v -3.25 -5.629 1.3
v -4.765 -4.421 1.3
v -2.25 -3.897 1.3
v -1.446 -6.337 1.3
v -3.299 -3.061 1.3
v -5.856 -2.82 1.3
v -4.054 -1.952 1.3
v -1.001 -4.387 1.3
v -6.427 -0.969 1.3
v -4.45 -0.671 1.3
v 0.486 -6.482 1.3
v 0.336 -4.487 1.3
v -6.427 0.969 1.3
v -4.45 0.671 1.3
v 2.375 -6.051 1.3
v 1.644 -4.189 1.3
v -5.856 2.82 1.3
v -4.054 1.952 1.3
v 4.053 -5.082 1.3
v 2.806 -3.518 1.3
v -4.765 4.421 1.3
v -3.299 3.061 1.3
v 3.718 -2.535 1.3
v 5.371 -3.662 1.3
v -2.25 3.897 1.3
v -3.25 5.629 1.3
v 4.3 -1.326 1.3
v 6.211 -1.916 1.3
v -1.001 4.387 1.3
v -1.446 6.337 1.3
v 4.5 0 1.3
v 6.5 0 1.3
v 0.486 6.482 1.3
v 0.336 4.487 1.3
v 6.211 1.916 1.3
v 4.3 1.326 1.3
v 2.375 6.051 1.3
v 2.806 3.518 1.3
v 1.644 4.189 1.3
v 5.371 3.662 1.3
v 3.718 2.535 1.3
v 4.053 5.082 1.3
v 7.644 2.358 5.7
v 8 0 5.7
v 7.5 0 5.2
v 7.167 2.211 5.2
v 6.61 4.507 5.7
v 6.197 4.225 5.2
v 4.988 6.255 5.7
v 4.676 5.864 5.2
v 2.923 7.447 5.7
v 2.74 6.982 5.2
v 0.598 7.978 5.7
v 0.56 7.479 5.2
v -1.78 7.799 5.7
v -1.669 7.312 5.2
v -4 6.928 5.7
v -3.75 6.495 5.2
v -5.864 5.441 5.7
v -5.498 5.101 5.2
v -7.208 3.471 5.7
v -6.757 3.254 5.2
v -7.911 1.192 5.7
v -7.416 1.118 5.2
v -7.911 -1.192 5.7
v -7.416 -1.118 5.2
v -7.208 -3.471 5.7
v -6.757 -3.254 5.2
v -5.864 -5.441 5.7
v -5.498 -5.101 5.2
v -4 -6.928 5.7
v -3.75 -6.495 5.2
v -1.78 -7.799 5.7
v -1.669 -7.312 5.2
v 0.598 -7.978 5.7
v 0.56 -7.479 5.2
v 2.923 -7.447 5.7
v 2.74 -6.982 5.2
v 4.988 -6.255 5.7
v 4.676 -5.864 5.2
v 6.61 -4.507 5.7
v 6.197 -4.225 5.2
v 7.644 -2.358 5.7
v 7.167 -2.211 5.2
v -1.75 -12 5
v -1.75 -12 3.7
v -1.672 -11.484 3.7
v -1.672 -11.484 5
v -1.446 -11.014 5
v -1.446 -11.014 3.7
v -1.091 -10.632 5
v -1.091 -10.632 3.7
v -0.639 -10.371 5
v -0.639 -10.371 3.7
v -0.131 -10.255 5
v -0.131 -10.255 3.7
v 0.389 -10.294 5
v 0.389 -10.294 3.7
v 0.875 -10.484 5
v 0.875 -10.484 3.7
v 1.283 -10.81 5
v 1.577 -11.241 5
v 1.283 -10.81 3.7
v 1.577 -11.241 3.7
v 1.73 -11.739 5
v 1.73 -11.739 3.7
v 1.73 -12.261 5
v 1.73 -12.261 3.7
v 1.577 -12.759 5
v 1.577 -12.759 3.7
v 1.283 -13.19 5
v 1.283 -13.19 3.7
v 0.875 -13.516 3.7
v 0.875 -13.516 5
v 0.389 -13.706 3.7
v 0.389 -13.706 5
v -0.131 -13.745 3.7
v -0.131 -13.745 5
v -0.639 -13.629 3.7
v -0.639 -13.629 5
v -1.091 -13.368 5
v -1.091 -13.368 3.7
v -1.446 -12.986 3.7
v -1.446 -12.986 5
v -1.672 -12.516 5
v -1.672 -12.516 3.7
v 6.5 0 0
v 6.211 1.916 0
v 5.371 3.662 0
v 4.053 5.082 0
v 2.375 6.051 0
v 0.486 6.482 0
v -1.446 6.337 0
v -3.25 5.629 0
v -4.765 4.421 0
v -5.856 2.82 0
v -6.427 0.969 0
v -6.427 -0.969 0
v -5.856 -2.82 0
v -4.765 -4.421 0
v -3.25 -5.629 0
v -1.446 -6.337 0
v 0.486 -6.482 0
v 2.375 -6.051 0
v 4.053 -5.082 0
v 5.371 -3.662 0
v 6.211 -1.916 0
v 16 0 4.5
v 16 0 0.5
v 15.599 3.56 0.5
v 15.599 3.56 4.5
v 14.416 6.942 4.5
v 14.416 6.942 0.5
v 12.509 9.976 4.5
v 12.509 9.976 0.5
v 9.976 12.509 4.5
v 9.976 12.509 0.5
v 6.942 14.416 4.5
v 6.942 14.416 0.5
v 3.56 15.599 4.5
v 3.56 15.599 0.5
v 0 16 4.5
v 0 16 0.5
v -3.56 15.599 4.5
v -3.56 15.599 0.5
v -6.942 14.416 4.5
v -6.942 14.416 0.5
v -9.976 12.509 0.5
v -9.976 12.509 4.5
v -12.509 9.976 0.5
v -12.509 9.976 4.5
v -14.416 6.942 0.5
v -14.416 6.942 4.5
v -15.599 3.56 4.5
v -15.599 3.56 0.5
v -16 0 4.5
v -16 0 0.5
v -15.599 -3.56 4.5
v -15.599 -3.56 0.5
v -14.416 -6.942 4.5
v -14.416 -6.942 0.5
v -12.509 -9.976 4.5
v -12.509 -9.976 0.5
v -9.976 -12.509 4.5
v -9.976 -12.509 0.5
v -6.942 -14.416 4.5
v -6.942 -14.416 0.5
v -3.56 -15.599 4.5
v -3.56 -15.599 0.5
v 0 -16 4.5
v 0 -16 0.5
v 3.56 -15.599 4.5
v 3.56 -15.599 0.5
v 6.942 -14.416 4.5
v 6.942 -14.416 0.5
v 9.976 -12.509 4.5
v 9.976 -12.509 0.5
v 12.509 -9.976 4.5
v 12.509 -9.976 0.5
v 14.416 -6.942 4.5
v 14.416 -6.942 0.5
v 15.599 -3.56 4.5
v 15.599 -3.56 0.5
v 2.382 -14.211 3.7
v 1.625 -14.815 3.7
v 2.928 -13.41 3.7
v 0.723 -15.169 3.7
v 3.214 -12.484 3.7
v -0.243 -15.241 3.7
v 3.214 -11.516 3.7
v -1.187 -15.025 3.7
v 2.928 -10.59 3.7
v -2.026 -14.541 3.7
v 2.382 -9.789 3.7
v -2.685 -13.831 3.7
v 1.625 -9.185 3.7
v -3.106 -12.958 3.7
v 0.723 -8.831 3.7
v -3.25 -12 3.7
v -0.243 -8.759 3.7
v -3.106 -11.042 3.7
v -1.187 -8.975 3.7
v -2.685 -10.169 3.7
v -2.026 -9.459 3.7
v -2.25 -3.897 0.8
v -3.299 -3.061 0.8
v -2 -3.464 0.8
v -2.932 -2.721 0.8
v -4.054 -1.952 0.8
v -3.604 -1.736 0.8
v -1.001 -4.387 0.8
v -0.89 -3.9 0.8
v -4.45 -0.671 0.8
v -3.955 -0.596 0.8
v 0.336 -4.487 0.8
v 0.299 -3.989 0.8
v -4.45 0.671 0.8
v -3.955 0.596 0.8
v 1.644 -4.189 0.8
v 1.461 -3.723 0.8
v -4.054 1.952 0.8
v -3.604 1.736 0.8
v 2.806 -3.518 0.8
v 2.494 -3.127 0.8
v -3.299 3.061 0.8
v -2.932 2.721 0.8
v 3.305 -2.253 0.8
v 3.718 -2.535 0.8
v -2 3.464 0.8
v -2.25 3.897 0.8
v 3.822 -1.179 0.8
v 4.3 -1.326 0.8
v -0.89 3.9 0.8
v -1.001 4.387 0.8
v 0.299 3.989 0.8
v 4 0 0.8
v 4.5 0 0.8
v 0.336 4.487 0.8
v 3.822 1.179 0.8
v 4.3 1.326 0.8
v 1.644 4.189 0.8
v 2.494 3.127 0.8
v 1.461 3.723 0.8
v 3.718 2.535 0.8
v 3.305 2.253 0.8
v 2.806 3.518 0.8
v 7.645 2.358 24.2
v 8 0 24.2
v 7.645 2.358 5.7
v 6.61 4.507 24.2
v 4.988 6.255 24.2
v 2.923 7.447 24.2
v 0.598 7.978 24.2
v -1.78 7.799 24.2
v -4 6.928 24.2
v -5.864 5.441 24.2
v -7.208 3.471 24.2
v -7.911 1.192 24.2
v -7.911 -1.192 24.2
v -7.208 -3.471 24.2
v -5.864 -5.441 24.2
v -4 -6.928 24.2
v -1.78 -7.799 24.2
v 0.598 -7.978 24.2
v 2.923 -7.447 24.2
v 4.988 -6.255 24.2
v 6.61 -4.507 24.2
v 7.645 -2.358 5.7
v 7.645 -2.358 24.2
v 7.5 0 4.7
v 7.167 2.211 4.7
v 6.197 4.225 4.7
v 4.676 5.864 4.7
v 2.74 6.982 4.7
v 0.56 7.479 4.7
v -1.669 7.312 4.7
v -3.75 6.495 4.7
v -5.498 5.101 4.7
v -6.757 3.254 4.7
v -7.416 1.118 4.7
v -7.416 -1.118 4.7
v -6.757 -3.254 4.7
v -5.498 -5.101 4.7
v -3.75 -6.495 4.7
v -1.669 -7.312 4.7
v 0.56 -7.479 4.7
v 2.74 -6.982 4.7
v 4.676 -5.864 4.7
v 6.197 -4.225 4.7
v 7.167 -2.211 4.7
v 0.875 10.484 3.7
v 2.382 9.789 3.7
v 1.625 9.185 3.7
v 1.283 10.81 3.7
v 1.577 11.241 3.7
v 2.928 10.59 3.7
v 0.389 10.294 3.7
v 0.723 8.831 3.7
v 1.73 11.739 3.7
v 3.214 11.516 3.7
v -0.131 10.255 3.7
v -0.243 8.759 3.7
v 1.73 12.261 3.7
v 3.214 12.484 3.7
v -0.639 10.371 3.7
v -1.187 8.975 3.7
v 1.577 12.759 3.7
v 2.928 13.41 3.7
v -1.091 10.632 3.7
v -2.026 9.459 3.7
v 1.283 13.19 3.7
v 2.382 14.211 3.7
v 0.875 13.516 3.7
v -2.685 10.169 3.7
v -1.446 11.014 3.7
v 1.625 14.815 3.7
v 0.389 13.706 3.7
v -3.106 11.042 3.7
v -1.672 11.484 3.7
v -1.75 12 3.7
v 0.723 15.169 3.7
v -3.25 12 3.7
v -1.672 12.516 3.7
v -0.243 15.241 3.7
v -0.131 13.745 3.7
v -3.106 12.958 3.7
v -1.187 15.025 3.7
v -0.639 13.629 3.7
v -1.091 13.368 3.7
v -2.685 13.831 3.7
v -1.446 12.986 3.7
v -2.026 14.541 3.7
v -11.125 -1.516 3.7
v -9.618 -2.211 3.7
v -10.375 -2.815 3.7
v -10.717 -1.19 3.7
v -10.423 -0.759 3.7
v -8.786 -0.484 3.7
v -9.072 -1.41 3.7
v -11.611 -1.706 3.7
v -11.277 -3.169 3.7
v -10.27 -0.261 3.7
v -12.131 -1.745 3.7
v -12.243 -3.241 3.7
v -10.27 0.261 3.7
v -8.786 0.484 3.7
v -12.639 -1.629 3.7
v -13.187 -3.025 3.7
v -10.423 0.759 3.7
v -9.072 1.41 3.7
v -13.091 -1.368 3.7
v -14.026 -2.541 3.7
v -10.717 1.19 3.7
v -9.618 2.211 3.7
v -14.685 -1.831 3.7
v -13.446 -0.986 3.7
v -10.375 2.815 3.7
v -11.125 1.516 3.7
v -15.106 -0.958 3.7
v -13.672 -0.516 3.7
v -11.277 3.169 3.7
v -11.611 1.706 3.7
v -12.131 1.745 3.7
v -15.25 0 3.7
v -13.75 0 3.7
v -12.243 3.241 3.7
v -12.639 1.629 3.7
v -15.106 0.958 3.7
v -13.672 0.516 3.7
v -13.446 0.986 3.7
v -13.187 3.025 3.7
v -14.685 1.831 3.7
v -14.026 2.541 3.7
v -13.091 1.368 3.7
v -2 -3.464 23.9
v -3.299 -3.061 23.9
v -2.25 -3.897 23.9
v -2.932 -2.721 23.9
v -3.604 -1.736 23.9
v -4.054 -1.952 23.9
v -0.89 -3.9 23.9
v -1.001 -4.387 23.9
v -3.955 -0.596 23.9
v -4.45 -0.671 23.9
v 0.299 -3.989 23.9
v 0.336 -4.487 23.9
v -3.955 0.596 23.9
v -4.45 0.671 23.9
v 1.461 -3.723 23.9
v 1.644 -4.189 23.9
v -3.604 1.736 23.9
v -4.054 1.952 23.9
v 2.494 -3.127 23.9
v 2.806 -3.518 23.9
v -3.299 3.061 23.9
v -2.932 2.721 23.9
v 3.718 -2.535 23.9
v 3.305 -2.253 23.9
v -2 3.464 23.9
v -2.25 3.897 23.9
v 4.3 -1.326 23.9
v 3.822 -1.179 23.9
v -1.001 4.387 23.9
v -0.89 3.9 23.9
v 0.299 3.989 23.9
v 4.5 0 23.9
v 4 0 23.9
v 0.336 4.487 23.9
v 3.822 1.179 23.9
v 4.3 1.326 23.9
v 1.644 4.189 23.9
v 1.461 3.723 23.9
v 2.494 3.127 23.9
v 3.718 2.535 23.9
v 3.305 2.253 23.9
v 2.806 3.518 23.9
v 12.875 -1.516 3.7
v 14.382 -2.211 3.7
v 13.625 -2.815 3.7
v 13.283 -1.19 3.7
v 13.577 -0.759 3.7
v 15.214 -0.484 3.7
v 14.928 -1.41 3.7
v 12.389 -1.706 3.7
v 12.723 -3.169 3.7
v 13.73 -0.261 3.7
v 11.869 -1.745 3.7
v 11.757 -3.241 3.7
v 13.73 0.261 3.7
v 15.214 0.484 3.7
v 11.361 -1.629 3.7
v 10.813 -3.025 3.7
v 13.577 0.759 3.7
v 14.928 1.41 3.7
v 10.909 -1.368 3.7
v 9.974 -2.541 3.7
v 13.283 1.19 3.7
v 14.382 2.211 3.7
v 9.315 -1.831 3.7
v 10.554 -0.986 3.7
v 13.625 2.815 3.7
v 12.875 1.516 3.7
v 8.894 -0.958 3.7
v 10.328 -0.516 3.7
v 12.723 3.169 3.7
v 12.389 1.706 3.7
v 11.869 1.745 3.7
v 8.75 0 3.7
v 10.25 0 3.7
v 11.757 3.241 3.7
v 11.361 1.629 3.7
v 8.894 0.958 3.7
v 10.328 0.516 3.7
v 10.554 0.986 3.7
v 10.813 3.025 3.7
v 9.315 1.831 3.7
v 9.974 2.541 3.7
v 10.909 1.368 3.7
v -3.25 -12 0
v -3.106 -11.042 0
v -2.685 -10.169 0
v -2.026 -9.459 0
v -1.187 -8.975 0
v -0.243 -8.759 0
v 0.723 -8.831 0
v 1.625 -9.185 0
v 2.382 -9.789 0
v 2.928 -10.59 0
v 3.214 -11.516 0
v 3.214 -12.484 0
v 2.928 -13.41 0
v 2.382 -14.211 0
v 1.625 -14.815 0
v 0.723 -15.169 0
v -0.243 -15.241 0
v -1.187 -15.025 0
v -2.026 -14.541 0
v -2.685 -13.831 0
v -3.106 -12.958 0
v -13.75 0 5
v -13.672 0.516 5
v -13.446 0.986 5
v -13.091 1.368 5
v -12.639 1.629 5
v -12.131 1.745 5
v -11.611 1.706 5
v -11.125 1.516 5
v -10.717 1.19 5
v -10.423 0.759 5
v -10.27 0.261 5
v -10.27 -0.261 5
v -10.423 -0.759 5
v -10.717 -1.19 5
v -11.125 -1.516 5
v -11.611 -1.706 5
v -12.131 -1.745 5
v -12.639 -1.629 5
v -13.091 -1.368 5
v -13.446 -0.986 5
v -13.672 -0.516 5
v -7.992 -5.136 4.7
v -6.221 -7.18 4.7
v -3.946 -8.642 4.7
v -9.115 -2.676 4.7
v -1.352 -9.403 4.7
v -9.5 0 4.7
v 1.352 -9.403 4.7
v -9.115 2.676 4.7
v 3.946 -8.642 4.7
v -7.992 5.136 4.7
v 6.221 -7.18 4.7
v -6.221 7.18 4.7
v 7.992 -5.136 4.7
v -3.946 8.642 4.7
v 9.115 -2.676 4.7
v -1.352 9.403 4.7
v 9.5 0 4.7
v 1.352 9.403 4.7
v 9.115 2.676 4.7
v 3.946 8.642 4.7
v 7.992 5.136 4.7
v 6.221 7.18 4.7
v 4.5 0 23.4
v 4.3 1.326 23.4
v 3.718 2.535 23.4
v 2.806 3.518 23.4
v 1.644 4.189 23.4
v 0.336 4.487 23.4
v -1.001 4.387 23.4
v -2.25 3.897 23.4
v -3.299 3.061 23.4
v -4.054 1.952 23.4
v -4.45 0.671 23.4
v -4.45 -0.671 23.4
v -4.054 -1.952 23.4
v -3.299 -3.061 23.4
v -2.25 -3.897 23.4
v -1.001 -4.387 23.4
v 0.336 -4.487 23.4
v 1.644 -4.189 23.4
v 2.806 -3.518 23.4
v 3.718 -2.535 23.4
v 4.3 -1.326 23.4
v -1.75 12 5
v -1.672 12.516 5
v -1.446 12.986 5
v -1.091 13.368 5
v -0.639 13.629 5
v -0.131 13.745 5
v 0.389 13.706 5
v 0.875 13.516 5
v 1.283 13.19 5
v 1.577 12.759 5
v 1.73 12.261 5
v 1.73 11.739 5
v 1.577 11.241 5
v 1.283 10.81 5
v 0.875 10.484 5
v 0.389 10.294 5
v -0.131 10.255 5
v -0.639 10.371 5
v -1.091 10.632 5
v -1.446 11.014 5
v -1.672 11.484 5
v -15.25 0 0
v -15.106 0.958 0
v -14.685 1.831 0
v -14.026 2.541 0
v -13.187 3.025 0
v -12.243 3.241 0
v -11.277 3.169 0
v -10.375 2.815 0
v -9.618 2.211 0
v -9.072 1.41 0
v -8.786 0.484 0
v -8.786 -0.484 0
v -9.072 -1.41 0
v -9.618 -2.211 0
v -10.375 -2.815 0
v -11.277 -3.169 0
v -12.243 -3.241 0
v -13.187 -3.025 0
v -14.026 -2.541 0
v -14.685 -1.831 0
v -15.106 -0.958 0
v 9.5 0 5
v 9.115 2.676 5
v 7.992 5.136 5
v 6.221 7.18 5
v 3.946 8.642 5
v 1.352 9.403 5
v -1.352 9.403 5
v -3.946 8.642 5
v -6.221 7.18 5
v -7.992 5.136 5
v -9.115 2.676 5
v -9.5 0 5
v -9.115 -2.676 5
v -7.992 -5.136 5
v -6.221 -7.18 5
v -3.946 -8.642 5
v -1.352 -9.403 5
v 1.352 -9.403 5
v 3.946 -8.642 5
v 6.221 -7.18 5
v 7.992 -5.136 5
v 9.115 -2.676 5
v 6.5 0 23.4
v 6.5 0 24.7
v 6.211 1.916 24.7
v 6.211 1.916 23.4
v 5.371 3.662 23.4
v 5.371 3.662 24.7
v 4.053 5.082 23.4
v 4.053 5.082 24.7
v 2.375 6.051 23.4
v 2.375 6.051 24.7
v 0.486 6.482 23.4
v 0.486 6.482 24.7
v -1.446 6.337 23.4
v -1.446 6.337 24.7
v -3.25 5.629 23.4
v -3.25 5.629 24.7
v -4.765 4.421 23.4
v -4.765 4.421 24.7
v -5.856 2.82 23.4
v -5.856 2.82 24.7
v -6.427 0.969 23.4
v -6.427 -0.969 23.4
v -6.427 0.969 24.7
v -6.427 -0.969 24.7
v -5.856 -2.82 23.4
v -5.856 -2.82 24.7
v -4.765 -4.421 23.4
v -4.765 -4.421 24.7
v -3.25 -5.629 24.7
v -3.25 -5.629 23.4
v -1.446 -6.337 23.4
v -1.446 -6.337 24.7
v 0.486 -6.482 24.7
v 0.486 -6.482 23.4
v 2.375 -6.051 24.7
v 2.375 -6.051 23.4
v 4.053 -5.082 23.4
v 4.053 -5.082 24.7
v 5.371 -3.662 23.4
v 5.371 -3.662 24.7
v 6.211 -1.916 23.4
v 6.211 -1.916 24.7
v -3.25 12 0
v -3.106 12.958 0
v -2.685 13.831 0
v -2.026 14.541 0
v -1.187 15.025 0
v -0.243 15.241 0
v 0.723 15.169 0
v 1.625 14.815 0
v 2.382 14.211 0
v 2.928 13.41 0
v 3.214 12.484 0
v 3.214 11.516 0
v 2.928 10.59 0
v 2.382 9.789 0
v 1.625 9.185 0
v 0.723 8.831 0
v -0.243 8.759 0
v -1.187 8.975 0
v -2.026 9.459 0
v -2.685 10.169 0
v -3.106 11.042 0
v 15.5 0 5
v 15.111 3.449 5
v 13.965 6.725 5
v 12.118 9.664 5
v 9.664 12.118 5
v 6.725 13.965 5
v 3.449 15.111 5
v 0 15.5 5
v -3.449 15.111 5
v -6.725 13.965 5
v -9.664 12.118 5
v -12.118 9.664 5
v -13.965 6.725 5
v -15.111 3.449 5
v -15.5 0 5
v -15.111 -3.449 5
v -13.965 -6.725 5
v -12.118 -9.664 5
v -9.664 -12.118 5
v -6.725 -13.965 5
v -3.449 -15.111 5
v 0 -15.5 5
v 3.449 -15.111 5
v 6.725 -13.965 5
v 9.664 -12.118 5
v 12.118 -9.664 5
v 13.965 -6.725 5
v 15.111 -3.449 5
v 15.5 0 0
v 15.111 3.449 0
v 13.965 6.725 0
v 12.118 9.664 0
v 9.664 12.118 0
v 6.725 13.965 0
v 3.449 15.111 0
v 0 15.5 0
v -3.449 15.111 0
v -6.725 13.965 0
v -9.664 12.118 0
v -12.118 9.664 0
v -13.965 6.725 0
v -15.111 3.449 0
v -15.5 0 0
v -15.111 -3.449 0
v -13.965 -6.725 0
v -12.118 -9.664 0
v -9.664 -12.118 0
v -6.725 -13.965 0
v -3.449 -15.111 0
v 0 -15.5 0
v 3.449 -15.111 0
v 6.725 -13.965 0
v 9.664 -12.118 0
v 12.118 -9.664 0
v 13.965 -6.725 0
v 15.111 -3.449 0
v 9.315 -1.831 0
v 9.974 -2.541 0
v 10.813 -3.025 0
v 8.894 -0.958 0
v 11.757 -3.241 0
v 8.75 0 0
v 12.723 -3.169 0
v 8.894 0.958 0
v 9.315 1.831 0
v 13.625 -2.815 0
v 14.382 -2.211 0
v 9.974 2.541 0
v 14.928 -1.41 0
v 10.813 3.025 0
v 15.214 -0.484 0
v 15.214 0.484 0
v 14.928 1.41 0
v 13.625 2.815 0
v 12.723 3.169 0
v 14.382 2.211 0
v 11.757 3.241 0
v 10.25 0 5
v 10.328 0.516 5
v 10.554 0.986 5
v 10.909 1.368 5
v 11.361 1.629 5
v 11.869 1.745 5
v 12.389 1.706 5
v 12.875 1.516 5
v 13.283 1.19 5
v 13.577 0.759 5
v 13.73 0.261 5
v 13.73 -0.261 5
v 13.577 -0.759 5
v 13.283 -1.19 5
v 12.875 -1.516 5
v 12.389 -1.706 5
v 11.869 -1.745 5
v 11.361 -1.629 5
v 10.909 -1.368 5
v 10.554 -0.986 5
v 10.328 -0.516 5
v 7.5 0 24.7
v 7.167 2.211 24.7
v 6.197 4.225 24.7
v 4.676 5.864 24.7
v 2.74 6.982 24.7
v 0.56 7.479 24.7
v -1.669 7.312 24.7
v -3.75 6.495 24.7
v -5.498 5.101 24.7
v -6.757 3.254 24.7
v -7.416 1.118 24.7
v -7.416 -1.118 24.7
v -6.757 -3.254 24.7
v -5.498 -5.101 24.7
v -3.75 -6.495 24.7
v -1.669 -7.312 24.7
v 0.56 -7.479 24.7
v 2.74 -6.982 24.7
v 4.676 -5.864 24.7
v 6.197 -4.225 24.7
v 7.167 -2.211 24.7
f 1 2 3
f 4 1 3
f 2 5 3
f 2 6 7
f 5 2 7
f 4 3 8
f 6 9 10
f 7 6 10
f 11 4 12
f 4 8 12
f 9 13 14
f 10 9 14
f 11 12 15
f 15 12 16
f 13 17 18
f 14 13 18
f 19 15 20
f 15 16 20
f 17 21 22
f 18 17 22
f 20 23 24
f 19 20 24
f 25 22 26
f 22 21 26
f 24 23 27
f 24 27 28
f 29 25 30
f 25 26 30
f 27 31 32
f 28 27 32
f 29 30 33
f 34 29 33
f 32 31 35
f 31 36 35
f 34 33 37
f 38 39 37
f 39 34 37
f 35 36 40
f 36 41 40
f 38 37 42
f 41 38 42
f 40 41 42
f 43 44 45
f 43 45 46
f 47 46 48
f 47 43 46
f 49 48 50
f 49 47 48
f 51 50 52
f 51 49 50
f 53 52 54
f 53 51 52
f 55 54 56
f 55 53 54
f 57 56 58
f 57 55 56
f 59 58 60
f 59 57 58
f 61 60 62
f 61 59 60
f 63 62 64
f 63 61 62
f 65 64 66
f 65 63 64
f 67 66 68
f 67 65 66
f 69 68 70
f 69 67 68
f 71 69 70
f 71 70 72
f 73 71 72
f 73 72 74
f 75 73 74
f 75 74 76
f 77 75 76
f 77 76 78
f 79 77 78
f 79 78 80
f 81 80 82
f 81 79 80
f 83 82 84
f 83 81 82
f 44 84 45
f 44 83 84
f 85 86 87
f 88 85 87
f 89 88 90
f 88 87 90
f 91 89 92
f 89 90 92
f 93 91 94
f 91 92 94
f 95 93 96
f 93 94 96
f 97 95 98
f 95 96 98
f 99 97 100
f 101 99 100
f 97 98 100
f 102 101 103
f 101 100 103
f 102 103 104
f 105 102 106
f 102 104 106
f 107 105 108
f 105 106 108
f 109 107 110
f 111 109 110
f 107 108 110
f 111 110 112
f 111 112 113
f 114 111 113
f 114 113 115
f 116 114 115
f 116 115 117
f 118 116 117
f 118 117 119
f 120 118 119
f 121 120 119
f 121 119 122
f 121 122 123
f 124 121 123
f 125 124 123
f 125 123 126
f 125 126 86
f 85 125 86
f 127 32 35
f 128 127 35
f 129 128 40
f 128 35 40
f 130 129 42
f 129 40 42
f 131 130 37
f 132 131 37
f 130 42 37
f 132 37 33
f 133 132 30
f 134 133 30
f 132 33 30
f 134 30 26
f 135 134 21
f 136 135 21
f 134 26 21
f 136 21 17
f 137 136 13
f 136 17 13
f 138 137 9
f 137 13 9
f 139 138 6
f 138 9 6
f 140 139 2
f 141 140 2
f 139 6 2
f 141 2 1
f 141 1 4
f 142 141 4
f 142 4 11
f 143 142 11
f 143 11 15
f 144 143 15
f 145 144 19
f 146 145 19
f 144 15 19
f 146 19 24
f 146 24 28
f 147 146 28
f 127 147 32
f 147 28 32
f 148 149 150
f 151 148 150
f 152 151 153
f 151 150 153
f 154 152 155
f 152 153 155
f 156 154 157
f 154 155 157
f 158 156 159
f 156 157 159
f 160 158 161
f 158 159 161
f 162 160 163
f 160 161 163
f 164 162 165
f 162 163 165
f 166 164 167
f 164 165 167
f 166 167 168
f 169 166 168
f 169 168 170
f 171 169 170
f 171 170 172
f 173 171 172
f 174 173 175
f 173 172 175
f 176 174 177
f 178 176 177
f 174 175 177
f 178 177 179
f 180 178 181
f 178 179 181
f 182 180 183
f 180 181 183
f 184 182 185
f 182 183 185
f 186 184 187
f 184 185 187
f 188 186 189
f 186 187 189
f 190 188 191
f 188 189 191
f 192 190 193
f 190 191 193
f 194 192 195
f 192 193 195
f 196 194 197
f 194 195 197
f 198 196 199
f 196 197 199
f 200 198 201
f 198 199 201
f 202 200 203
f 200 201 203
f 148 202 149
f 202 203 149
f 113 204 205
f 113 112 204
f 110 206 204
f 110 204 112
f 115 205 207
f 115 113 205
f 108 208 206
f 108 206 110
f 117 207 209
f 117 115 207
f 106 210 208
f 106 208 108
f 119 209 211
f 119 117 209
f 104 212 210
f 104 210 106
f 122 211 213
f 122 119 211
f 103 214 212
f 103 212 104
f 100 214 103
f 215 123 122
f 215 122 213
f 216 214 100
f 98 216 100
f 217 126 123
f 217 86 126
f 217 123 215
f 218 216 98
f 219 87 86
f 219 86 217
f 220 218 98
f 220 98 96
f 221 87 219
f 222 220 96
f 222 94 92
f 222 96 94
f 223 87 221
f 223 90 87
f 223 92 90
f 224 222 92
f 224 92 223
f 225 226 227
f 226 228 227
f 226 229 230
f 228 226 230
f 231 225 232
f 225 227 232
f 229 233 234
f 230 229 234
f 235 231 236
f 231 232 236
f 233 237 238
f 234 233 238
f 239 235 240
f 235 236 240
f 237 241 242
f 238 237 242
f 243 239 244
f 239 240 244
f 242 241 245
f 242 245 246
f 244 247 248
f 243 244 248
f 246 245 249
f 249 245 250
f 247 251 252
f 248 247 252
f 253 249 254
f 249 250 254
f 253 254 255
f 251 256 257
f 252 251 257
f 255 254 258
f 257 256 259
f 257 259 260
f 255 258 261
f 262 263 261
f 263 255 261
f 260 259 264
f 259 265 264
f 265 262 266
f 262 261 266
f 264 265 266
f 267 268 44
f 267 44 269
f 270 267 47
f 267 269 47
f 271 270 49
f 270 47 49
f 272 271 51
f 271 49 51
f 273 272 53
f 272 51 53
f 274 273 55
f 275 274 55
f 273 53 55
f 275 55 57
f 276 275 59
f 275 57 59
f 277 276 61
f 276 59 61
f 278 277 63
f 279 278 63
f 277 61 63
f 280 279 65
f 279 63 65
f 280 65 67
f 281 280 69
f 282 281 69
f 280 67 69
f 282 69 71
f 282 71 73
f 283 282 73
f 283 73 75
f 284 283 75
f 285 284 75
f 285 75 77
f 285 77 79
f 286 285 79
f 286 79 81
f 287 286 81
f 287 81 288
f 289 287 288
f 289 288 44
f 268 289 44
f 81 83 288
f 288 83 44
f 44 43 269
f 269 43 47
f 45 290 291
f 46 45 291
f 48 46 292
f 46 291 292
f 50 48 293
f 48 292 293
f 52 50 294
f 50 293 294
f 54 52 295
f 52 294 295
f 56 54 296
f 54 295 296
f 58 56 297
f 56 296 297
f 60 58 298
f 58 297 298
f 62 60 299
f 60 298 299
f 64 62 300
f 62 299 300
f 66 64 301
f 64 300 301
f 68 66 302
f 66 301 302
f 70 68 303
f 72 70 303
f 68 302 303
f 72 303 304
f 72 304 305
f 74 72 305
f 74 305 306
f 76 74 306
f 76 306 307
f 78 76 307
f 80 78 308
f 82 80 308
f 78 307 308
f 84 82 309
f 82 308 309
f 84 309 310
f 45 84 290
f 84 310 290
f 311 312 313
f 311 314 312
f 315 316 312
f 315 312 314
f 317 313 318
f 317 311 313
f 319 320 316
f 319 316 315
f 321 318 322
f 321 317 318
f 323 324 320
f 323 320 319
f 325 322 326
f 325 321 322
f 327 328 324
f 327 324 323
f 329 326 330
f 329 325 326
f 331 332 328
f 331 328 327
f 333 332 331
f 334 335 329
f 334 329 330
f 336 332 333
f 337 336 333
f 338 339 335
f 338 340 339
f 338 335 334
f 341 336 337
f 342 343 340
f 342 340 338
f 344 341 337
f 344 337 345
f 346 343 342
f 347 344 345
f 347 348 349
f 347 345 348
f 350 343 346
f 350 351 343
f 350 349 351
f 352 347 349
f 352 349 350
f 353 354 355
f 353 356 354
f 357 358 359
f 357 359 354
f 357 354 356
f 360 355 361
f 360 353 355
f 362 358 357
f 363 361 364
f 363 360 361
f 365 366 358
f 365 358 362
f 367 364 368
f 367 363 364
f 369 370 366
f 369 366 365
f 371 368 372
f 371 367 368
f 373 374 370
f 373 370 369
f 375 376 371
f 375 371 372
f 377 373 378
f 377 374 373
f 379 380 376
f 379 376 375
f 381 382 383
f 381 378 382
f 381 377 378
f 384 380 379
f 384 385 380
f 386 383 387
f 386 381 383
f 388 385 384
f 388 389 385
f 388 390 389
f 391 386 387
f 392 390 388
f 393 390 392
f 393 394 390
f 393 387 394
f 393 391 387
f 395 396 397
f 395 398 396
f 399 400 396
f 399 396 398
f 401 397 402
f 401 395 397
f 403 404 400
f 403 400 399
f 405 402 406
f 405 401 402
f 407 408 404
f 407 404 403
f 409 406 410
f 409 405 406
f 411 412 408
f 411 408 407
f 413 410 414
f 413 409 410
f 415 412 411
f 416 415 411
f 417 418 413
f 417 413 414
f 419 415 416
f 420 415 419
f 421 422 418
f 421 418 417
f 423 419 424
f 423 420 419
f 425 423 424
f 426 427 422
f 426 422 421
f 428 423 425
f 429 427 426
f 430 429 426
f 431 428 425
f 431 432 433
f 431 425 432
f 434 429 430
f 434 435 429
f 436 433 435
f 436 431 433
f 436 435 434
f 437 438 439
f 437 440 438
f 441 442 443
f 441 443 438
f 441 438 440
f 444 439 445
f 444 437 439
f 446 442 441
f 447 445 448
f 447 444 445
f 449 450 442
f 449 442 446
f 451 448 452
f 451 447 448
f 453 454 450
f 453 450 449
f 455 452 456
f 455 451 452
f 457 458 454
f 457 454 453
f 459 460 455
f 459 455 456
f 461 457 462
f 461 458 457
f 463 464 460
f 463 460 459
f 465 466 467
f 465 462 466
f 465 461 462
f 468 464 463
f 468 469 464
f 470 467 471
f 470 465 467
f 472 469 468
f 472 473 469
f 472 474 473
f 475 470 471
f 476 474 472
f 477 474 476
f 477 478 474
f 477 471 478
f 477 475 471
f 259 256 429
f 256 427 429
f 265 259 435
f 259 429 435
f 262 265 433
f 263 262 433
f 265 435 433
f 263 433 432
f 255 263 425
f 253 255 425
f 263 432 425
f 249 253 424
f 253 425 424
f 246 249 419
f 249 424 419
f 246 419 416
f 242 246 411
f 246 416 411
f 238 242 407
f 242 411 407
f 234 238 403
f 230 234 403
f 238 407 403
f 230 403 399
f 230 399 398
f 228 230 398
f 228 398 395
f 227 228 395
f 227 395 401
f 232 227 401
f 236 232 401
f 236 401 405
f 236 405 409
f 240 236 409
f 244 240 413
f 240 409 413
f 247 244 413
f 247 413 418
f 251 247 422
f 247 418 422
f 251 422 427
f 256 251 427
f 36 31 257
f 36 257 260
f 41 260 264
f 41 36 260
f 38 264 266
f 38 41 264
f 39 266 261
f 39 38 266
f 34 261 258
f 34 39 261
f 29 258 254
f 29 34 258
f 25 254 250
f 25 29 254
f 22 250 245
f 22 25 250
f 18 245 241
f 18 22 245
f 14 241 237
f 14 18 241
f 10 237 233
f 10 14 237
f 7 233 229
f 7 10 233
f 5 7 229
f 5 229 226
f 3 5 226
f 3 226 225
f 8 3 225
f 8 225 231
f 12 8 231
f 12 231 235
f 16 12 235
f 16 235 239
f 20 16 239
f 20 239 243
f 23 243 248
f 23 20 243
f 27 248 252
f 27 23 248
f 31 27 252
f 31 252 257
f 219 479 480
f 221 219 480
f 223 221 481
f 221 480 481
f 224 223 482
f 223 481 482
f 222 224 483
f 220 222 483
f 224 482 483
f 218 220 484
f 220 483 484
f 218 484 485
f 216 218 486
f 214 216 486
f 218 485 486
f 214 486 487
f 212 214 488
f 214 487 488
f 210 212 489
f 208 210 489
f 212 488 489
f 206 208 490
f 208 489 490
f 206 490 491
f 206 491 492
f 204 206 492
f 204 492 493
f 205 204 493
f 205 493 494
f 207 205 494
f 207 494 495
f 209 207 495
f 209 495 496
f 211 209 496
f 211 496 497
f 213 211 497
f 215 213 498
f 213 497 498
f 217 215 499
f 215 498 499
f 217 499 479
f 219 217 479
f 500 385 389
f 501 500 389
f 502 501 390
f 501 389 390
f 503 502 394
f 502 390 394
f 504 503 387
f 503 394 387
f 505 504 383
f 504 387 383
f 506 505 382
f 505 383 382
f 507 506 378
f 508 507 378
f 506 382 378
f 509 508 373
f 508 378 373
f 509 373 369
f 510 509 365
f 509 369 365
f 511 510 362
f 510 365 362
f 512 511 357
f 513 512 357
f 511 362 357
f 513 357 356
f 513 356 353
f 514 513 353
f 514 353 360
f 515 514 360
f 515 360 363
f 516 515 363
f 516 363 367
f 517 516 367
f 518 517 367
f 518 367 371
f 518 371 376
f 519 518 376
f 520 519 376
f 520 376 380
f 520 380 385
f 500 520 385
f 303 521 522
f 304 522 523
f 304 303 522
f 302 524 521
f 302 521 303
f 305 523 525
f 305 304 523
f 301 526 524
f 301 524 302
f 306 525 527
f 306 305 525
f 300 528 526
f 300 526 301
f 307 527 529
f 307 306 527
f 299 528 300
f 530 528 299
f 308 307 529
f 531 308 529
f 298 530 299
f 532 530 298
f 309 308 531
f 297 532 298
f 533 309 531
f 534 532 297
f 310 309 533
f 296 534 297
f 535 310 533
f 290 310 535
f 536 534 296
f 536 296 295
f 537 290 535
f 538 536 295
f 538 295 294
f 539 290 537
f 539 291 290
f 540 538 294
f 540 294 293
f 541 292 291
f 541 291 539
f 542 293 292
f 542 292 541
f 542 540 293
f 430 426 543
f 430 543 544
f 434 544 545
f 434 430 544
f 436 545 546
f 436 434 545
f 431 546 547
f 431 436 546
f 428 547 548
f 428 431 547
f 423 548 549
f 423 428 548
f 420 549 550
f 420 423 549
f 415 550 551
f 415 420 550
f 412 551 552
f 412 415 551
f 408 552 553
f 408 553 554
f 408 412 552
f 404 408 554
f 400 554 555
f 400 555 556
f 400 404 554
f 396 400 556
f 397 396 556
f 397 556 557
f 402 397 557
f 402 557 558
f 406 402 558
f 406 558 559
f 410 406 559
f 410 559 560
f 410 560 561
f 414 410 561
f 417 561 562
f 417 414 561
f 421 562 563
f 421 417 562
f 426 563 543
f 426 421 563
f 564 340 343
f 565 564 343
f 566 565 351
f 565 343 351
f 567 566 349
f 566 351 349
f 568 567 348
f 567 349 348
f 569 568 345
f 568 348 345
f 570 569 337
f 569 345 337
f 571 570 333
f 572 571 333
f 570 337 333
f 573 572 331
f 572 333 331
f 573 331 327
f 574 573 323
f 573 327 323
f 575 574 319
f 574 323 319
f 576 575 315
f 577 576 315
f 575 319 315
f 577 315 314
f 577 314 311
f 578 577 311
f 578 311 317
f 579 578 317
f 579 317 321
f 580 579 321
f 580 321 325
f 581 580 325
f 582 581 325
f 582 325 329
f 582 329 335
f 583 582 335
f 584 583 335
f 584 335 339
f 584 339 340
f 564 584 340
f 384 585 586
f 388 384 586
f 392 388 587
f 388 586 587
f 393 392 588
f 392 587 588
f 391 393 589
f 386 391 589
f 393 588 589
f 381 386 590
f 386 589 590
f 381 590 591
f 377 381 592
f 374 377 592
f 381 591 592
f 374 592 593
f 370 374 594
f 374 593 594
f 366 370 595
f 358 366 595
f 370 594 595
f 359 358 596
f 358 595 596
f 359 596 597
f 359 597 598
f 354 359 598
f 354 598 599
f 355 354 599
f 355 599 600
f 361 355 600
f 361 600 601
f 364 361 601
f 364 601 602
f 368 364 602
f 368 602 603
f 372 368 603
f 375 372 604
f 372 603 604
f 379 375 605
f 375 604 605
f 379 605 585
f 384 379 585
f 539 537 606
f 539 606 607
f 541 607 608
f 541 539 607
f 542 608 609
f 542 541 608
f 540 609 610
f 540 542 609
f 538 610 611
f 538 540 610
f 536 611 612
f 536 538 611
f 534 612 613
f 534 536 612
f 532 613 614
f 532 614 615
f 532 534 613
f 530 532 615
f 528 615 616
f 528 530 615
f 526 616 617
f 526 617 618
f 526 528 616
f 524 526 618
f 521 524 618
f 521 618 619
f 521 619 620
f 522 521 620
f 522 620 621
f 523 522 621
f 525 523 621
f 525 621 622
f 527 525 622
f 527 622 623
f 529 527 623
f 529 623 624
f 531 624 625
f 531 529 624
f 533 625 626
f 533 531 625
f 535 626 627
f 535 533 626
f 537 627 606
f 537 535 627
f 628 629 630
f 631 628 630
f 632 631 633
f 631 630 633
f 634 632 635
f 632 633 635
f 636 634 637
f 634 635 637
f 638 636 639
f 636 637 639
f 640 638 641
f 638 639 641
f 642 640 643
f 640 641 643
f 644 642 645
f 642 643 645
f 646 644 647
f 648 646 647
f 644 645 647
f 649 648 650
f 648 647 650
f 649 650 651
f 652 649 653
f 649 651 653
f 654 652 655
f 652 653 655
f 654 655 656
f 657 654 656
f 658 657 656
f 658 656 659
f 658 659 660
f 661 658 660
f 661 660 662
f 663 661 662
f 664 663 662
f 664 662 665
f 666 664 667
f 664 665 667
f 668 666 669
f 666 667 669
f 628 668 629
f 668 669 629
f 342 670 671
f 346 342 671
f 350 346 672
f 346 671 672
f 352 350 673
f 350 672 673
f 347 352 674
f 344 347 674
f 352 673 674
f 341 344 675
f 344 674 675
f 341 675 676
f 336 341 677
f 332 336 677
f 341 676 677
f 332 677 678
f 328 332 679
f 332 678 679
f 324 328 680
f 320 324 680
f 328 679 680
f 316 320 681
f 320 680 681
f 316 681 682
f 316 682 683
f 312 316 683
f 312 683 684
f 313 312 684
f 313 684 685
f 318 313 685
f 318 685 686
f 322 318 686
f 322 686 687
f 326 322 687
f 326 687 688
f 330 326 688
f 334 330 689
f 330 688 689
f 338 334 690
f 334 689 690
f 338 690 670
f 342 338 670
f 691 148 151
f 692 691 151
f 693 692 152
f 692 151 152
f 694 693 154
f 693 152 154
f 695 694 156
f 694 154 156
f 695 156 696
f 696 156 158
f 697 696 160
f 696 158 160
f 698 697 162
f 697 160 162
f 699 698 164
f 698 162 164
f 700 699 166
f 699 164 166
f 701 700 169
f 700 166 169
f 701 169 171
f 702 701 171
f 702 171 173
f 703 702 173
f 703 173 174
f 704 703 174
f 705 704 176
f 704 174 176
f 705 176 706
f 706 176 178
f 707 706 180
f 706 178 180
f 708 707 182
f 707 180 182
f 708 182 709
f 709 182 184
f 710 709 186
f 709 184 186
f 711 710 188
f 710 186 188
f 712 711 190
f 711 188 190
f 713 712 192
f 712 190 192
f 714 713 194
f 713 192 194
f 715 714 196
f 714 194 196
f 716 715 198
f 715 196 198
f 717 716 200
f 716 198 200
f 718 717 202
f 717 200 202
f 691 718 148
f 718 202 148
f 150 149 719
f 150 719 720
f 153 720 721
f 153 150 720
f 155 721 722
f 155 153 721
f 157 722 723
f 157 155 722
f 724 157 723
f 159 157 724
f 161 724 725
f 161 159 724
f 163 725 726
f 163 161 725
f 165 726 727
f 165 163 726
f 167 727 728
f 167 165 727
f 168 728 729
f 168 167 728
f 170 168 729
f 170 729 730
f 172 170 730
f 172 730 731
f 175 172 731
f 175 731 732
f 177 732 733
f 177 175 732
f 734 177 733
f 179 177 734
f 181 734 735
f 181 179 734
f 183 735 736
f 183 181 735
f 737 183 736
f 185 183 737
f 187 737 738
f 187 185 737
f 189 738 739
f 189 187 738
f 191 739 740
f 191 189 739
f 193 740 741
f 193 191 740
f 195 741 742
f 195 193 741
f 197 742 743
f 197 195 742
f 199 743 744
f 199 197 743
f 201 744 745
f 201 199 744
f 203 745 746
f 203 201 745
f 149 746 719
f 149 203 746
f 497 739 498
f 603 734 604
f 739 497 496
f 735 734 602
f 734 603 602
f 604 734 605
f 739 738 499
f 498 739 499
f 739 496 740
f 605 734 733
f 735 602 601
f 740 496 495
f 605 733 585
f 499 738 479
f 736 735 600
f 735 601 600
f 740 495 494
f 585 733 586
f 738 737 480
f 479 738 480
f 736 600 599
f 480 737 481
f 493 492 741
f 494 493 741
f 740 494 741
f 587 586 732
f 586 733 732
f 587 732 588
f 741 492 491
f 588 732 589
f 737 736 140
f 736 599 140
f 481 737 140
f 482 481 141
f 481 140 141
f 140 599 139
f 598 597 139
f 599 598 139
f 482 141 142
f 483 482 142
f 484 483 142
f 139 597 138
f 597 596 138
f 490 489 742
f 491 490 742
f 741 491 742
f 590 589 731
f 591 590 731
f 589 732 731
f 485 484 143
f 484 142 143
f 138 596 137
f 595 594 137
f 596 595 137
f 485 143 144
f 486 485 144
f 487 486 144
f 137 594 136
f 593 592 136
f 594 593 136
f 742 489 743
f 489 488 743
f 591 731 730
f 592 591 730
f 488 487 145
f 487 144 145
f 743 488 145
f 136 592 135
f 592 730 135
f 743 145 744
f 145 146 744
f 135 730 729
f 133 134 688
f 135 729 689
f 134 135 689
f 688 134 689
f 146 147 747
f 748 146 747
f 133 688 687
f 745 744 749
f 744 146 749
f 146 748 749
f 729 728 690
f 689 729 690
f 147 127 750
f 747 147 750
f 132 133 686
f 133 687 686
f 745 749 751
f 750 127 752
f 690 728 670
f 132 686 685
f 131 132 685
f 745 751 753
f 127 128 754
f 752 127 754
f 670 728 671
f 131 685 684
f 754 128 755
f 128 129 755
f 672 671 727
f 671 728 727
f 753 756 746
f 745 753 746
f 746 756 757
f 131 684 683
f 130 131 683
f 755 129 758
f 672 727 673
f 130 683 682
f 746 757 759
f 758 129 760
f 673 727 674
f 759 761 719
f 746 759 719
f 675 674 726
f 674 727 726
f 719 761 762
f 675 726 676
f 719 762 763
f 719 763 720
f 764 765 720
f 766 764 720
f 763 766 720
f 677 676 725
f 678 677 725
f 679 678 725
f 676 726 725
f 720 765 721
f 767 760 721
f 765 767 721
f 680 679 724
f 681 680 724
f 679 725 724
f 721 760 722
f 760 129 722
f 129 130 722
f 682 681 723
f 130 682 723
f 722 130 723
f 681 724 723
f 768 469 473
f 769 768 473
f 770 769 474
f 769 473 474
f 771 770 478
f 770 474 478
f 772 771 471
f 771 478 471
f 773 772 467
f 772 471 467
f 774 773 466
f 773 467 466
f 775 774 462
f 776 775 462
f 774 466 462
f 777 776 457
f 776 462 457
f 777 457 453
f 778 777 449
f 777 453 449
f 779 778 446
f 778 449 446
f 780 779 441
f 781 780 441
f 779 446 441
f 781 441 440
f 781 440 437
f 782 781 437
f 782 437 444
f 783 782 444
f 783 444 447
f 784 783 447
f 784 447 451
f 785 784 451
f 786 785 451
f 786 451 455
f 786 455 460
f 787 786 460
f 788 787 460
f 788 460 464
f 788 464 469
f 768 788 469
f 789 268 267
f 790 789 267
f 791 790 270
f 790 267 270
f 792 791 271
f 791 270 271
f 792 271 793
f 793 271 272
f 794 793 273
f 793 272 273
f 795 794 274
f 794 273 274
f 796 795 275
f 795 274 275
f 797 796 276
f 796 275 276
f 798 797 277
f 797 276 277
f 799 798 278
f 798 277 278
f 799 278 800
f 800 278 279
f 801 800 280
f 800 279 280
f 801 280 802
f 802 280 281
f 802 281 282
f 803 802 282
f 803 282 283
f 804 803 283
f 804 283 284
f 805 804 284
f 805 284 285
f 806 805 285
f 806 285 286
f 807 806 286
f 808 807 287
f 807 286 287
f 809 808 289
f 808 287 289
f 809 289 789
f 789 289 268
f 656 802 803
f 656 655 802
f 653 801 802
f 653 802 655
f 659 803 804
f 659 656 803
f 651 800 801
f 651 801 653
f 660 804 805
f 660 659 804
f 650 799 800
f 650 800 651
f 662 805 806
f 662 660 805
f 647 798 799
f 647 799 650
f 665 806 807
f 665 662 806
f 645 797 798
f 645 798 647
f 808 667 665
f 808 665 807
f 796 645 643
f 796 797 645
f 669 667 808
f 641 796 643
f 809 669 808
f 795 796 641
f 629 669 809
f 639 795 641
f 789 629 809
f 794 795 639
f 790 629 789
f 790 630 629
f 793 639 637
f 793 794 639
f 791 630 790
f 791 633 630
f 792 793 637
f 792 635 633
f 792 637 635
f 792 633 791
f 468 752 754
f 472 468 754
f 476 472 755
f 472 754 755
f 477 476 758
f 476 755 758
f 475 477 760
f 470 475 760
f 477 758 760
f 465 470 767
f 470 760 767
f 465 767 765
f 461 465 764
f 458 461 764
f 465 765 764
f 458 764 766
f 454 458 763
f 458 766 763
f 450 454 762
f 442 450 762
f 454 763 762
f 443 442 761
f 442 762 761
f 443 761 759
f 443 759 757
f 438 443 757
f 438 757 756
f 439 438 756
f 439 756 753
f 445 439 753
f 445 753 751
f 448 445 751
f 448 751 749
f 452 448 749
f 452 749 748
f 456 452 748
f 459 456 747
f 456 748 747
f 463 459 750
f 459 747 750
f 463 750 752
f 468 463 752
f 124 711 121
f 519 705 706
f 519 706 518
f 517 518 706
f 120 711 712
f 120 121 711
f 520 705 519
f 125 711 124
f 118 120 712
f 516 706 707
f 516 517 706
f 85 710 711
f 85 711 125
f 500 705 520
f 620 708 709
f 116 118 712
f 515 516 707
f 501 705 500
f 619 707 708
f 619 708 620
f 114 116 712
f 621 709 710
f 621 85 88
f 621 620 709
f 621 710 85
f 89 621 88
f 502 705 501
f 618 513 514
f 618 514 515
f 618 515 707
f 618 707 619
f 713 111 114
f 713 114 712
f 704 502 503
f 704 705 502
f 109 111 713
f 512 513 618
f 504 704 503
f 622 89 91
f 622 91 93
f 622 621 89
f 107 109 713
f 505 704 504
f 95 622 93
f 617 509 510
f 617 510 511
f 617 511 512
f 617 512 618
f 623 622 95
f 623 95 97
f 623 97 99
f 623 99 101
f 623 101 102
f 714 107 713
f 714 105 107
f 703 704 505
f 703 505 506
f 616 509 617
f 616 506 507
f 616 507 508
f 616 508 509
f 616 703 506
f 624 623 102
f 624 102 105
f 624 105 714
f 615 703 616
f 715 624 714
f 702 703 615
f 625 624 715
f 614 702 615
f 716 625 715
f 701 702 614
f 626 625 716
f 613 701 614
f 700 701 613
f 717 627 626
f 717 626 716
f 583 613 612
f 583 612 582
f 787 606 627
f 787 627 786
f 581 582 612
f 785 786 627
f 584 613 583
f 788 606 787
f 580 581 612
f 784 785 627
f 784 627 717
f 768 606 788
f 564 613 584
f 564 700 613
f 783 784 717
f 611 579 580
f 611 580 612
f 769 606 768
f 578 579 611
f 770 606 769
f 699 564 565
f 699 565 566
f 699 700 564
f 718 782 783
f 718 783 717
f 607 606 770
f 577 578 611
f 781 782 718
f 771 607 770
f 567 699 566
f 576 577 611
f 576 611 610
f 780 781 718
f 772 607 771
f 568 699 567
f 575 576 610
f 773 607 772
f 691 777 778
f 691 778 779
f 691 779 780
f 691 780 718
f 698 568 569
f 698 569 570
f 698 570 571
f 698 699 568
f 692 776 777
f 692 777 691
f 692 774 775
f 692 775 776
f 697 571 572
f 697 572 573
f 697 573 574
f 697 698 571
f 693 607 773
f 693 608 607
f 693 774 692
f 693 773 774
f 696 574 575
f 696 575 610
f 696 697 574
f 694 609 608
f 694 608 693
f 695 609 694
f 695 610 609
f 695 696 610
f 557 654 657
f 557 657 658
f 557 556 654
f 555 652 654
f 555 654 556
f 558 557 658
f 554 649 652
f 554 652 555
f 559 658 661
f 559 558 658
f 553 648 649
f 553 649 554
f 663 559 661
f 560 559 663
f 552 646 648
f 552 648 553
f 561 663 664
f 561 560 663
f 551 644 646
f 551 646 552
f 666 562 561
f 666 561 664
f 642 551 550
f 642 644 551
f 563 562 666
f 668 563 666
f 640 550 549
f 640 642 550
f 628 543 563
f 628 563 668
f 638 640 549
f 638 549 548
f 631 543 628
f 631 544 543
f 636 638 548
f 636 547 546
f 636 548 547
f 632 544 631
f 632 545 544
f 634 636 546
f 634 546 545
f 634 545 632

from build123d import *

# Parameters (mm, degrees)
IZIM1_R                     = 16
Y_KSEKLIK_EKSTR_ZYON1_DEPTH = 5
IZIM2_R                     = 8
Y_KSEKLIK_EKSTR_ZYON2_DEPTH = 19.7
KES_EKSTR_ZYON1_REACH       = 35.498
IZIM3_R                     = 4
KES_EKSTR_ZYON2_REACH       = 35.498
IZIM4_R                     = 1.75
IZIM4_3_R                   = 3.25
IZIM4_3_R_2                 = 1.75
KES_EKSTR_ZYON3_DEPTH       = 3.7
IZIM5_R                     = 6.5
KES_EKSTR_ZYON4_DEPTH       = 1.3
KES_EKSTR_ZYON5_START       = -23.4
IZIM5_2_R                   = 6.5
KES_EKSTR_ZYON5_DEPTH       = 1.3
KES_EKSTR_ZYON7_START       = -0.3
IZIM7_R                     = 9.5
IZIM7_R_2                   = 8
KES_EKSTR_ZYON7_DEPTH       = 0.3
IZIM8_R                     = 8
IZIM8_R_2                   = 7.5
KES_EKSTR_ZYON8_DEPTH       = 1
PAH1_SIZE                   = 0.5
Y_KSEKLIK_EKSTR_ZYON3_START = 0.5
IZIM9_R                     = 4.5
IZIM9_R_2                   = 4
Y_KSEKLIK_EKSTR_ZYON3_DEPTH = 0.5
Y_KSEKLIK_EKSTR_ZYON4_START = -22.1
IZIM9_2_R                   = 4.5
IZIM9_2_R_2                 = 4
Y_KSEKLIK_EKSTR_ZYON4_DEPTH = 0.5
PAH2_SIZE                   = 0.5


with BuildPart() as part:
    # Çizim1 → Yükseklik-Ekstrüzyon1 (new body)
    with BuildSketch(Plane.XY):
        Circle(IZIM1_R)
    extrude(amount=Y_KSEKLIK_EKSTR_ZYON1_DEPTH)

    # Çizim2 → Yükseklik-Ekstrüzyon2 (add)
    with BuildSketch(Plane.XY.offset(5)):
        Circle(IZIM2_R)
    extrude(amount=Y_KSEKLIK_EKSTR_ZYON2_DEPTH)

    # Çizim3 → Kes-Ekstrüzyon1 (cut, up to next)
    with BuildSketch(Plane.XY.offset(24.7), mode=Mode.PRIVATE) as kes_ekstr_zyon1_sk1:
        Circle(IZIM3_R)
    kes_ekstr_zyon1_tool1 = extrude(kes_ekstr_zyon1_sk1.sketch, amount=-KES_EKSTR_ZYON1_REACH, mode=Mode.PRIVATE) & part.part
    add(kes_ekstr_zyon1_tool1.solids().sort_by_distance((0, 0, 24.7))[0], mode=Mode.SUBTRACT)

    # Çizim4 → Kes-Ekstrüzyon2 (cut, up to next)
    with BuildSketch(Plane(origin=(0, 0, 0), x_dir=(-1, 0, 0), z_dir=(0, 0, -1)), mode=Mode.PRIVATE) as kes_ekstr_zyon2_sk1:
        with Locations((0, 12)):
            Circle(IZIM4_R)
    kes_ekstr_zyon2_tool1 = extrude(kes_ekstr_zyon2_sk1.sketch, amount=-KES_EKSTR_ZYON2_REACH, mode=Mode.PRIVATE) & part.part
    # Çizim4 → Kes-Ekstrüzyon2 (cut, up to next)
    with BuildSketch(Plane(origin=(0, 0, 0), x_dir=(-1, 0, 0), z_dir=(0, 0, -1)), mode=Mode.PRIVATE) as kes_ekstr_zyon2_sk2:
        with Locations((12, 0)):
            Circle(IZIM4_R)
    kes_ekstr_zyon2_tool2 = extrude(kes_ekstr_zyon2_sk2.sketch, amount=-KES_EKSTR_ZYON2_REACH, mode=Mode.PRIVATE) & part.part
    # Çizim4 → Kes-Ekstrüzyon2 (cut, up to next)
    with BuildSketch(Plane(origin=(0, 0, 0), x_dir=(-1, 0, 0), z_dir=(0, 0, -1)), mode=Mode.PRIVATE) as kes_ekstr_zyon2_sk3:
        with Locations((0, -12)):
            Circle(IZIM4_R)
    kes_ekstr_zyon2_tool3 = extrude(kes_ekstr_zyon2_sk3.sketch, amount=-KES_EKSTR_ZYON2_REACH, mode=Mode.PRIVATE) & part.part
    # Çizim4 → Kes-Ekstrüzyon2 (cut, up to next)
    with BuildSketch(Plane(origin=(0, 0, 0), x_dir=(-1, 0, 0), z_dir=(0, 0, -1)), mode=Mode.PRIVATE) as kes_ekstr_zyon2_sk4:
        with Locations((-12, 0)):
            Circle(IZIM4_R)
    kes_ekstr_zyon2_tool4 = extrude(kes_ekstr_zyon2_sk4.sketch, amount=-KES_EKSTR_ZYON2_REACH, mode=Mode.PRIVATE) & part.part
    add(kes_ekstr_zyon2_tool1.solids().sort_by_distance((0, 12, 0))[0], mode=Mode.SUBTRACT)
    add(kes_ekstr_zyon2_tool2.solids().sort_by_distance((-12, 0, 0))[0], mode=Mode.SUBTRACT)
    add(kes_ekstr_zyon2_tool3.solids().sort_by_distance((0, -12, 0))[0], mode=Mode.SUBTRACT)
    add(kes_ekstr_zyon2_tool4.solids().sort_by_distance((12, 0, 0))[0], mode=Mode.SUBTRACT)

    # Çizim4<3> → Kes-Ekstrüzyon3 (cut)
    # profile 1 of 4: a face of its own
    with BuildSketch(Plane(origin=(0, 0, 0), x_dir=(-1, 0, 0), z_dir=(0, 0, -1))):
        with Locations((0, 12)):
            Circle(IZIM4_3_R)
        with Locations((0, 12)):
            Circle(IZIM4_3_R_2, mode=Mode.SUBTRACT)
    # profile 2 of 4: a face of its own
    with BuildSketch(Plane(origin=(0, 0, 0), x_dir=(-1, 0, 0), z_dir=(0, 0, -1))):
        with Locations((12, 0)):
            Circle(IZIM4_3_R)
        with Locations((12, 0)):
            Circle(IZIM4_3_R_2, mode=Mode.SUBTRACT)
    # profile 3 of 4: a face of its own
    with BuildSketch(Plane(origin=(0, 0, 0), x_dir=(-1, 0, 0), z_dir=(0, 0, -1))):
        with Locations((0, -12)):
            Circle(IZIM4_3_R)
        with Locations((0, -12)):
            Circle(IZIM4_3_R_2, mode=Mode.SUBTRACT)
    # profile 4 of 4: a face of its own
    with BuildSketch(Plane(origin=(0, 0, 0), x_dir=(-1, 0, 0), z_dir=(0, 0, -1))):
        with Locations((-12, 0)):
            Circle(IZIM4_3_R)
        with Locations((-12, 0)):
            Circle(IZIM4_3_R_2, mode=Mode.SUBTRACT)
    extrude(amount=-KES_EKSTR_ZYON3_DEPTH, mode=Mode.SUBTRACT)

    # Çizim5 → Kes-Ekstrüzyon4 (cut)
    with BuildSketch(Plane.XY.offset(24.7)):
        Circle(IZIM5_R)
    extrude(amount=-KES_EKSTR_ZYON4_DEPTH, mode=Mode.SUBTRACT)

    # Çizim5<2> → Kes-Ekstrüzyon5 (cut)
    with BuildSketch(Plane.XY.offset(24.7).offset(KES_EKSTR_ZYON5_START)):
        Circle(IZIM5_2_R)
    extrude(amount=-KES_EKSTR_ZYON5_DEPTH, mode=Mode.SUBTRACT)

    # Çizim7 → Kes-Ekstrüzyon7 (cut)
    with BuildSketch(Plane.XY.offset(5).offset(KES_EKSTR_ZYON7_START)):
        Circle(IZIM7_R)
        Circle(IZIM7_R_2, mode=Mode.SUBTRACT)
    extrude(amount=KES_EKSTR_ZYON7_DEPTH, mode=Mode.SUBTRACT)

    # Çizim8 → Kes-Ekstrüzyon8 (cut)
    with BuildSketch(Plane.XY.offset(4.7)):
        Circle(IZIM8_R)
        Circle(IZIM8_R_2, mode=Mode.SUBTRACT)
    extrude(amount=KES_EKSTR_ZYON8_DEPTH, mode=Mode.SUBTRACT)

    # Pah1
    pah1_edges = [part.edges().sort_by_distance(p)[0] for p in [
        (-7.5, 0, 5.7),
    ]]
    chamfer(pah1_edges, length=PAH1_SIZE - 0.0001)  # a hair under: the kernel refuses the full size

    # Çizim9 → Yükseklik-Ekstrüzyon3 (add)
    with BuildSketch(Plane.XY.offset(23.4).offset(Y_KSEKLIK_EKSTR_ZYON3_START)):
        Circle(IZIM9_R)
        Circle(IZIM9_R_2, mode=Mode.SUBTRACT)
    extrude(amount=-Y_KSEKLIK_EKSTR_ZYON3_DEPTH)

    # Çizim9<2> → Yükseklik-Ekstrüzyon4 (add)
    with BuildSketch(Plane.XY.offset(23.4).offset(Y_KSEKLIK_EKSTR_ZYON4_START)):
        Circle(IZIM9_2_R)
        Circle(IZIM9_2_R_2, mode=Mode.SUBTRACT)
    extrude(amount=-Y_KSEKLIK_EKSTR_ZYON4_DEPTH)

    # Pah2
    pah2_edges = [part.edges().sort_by_distance(p)[0] for p in [
        (-16, 0, 0),
        (-16, 0, 5),
        (-8, 0, 24.7),
    ]]
    chamfer(pah2_edges, length=PAH2_SIZE)


solid = part.part
